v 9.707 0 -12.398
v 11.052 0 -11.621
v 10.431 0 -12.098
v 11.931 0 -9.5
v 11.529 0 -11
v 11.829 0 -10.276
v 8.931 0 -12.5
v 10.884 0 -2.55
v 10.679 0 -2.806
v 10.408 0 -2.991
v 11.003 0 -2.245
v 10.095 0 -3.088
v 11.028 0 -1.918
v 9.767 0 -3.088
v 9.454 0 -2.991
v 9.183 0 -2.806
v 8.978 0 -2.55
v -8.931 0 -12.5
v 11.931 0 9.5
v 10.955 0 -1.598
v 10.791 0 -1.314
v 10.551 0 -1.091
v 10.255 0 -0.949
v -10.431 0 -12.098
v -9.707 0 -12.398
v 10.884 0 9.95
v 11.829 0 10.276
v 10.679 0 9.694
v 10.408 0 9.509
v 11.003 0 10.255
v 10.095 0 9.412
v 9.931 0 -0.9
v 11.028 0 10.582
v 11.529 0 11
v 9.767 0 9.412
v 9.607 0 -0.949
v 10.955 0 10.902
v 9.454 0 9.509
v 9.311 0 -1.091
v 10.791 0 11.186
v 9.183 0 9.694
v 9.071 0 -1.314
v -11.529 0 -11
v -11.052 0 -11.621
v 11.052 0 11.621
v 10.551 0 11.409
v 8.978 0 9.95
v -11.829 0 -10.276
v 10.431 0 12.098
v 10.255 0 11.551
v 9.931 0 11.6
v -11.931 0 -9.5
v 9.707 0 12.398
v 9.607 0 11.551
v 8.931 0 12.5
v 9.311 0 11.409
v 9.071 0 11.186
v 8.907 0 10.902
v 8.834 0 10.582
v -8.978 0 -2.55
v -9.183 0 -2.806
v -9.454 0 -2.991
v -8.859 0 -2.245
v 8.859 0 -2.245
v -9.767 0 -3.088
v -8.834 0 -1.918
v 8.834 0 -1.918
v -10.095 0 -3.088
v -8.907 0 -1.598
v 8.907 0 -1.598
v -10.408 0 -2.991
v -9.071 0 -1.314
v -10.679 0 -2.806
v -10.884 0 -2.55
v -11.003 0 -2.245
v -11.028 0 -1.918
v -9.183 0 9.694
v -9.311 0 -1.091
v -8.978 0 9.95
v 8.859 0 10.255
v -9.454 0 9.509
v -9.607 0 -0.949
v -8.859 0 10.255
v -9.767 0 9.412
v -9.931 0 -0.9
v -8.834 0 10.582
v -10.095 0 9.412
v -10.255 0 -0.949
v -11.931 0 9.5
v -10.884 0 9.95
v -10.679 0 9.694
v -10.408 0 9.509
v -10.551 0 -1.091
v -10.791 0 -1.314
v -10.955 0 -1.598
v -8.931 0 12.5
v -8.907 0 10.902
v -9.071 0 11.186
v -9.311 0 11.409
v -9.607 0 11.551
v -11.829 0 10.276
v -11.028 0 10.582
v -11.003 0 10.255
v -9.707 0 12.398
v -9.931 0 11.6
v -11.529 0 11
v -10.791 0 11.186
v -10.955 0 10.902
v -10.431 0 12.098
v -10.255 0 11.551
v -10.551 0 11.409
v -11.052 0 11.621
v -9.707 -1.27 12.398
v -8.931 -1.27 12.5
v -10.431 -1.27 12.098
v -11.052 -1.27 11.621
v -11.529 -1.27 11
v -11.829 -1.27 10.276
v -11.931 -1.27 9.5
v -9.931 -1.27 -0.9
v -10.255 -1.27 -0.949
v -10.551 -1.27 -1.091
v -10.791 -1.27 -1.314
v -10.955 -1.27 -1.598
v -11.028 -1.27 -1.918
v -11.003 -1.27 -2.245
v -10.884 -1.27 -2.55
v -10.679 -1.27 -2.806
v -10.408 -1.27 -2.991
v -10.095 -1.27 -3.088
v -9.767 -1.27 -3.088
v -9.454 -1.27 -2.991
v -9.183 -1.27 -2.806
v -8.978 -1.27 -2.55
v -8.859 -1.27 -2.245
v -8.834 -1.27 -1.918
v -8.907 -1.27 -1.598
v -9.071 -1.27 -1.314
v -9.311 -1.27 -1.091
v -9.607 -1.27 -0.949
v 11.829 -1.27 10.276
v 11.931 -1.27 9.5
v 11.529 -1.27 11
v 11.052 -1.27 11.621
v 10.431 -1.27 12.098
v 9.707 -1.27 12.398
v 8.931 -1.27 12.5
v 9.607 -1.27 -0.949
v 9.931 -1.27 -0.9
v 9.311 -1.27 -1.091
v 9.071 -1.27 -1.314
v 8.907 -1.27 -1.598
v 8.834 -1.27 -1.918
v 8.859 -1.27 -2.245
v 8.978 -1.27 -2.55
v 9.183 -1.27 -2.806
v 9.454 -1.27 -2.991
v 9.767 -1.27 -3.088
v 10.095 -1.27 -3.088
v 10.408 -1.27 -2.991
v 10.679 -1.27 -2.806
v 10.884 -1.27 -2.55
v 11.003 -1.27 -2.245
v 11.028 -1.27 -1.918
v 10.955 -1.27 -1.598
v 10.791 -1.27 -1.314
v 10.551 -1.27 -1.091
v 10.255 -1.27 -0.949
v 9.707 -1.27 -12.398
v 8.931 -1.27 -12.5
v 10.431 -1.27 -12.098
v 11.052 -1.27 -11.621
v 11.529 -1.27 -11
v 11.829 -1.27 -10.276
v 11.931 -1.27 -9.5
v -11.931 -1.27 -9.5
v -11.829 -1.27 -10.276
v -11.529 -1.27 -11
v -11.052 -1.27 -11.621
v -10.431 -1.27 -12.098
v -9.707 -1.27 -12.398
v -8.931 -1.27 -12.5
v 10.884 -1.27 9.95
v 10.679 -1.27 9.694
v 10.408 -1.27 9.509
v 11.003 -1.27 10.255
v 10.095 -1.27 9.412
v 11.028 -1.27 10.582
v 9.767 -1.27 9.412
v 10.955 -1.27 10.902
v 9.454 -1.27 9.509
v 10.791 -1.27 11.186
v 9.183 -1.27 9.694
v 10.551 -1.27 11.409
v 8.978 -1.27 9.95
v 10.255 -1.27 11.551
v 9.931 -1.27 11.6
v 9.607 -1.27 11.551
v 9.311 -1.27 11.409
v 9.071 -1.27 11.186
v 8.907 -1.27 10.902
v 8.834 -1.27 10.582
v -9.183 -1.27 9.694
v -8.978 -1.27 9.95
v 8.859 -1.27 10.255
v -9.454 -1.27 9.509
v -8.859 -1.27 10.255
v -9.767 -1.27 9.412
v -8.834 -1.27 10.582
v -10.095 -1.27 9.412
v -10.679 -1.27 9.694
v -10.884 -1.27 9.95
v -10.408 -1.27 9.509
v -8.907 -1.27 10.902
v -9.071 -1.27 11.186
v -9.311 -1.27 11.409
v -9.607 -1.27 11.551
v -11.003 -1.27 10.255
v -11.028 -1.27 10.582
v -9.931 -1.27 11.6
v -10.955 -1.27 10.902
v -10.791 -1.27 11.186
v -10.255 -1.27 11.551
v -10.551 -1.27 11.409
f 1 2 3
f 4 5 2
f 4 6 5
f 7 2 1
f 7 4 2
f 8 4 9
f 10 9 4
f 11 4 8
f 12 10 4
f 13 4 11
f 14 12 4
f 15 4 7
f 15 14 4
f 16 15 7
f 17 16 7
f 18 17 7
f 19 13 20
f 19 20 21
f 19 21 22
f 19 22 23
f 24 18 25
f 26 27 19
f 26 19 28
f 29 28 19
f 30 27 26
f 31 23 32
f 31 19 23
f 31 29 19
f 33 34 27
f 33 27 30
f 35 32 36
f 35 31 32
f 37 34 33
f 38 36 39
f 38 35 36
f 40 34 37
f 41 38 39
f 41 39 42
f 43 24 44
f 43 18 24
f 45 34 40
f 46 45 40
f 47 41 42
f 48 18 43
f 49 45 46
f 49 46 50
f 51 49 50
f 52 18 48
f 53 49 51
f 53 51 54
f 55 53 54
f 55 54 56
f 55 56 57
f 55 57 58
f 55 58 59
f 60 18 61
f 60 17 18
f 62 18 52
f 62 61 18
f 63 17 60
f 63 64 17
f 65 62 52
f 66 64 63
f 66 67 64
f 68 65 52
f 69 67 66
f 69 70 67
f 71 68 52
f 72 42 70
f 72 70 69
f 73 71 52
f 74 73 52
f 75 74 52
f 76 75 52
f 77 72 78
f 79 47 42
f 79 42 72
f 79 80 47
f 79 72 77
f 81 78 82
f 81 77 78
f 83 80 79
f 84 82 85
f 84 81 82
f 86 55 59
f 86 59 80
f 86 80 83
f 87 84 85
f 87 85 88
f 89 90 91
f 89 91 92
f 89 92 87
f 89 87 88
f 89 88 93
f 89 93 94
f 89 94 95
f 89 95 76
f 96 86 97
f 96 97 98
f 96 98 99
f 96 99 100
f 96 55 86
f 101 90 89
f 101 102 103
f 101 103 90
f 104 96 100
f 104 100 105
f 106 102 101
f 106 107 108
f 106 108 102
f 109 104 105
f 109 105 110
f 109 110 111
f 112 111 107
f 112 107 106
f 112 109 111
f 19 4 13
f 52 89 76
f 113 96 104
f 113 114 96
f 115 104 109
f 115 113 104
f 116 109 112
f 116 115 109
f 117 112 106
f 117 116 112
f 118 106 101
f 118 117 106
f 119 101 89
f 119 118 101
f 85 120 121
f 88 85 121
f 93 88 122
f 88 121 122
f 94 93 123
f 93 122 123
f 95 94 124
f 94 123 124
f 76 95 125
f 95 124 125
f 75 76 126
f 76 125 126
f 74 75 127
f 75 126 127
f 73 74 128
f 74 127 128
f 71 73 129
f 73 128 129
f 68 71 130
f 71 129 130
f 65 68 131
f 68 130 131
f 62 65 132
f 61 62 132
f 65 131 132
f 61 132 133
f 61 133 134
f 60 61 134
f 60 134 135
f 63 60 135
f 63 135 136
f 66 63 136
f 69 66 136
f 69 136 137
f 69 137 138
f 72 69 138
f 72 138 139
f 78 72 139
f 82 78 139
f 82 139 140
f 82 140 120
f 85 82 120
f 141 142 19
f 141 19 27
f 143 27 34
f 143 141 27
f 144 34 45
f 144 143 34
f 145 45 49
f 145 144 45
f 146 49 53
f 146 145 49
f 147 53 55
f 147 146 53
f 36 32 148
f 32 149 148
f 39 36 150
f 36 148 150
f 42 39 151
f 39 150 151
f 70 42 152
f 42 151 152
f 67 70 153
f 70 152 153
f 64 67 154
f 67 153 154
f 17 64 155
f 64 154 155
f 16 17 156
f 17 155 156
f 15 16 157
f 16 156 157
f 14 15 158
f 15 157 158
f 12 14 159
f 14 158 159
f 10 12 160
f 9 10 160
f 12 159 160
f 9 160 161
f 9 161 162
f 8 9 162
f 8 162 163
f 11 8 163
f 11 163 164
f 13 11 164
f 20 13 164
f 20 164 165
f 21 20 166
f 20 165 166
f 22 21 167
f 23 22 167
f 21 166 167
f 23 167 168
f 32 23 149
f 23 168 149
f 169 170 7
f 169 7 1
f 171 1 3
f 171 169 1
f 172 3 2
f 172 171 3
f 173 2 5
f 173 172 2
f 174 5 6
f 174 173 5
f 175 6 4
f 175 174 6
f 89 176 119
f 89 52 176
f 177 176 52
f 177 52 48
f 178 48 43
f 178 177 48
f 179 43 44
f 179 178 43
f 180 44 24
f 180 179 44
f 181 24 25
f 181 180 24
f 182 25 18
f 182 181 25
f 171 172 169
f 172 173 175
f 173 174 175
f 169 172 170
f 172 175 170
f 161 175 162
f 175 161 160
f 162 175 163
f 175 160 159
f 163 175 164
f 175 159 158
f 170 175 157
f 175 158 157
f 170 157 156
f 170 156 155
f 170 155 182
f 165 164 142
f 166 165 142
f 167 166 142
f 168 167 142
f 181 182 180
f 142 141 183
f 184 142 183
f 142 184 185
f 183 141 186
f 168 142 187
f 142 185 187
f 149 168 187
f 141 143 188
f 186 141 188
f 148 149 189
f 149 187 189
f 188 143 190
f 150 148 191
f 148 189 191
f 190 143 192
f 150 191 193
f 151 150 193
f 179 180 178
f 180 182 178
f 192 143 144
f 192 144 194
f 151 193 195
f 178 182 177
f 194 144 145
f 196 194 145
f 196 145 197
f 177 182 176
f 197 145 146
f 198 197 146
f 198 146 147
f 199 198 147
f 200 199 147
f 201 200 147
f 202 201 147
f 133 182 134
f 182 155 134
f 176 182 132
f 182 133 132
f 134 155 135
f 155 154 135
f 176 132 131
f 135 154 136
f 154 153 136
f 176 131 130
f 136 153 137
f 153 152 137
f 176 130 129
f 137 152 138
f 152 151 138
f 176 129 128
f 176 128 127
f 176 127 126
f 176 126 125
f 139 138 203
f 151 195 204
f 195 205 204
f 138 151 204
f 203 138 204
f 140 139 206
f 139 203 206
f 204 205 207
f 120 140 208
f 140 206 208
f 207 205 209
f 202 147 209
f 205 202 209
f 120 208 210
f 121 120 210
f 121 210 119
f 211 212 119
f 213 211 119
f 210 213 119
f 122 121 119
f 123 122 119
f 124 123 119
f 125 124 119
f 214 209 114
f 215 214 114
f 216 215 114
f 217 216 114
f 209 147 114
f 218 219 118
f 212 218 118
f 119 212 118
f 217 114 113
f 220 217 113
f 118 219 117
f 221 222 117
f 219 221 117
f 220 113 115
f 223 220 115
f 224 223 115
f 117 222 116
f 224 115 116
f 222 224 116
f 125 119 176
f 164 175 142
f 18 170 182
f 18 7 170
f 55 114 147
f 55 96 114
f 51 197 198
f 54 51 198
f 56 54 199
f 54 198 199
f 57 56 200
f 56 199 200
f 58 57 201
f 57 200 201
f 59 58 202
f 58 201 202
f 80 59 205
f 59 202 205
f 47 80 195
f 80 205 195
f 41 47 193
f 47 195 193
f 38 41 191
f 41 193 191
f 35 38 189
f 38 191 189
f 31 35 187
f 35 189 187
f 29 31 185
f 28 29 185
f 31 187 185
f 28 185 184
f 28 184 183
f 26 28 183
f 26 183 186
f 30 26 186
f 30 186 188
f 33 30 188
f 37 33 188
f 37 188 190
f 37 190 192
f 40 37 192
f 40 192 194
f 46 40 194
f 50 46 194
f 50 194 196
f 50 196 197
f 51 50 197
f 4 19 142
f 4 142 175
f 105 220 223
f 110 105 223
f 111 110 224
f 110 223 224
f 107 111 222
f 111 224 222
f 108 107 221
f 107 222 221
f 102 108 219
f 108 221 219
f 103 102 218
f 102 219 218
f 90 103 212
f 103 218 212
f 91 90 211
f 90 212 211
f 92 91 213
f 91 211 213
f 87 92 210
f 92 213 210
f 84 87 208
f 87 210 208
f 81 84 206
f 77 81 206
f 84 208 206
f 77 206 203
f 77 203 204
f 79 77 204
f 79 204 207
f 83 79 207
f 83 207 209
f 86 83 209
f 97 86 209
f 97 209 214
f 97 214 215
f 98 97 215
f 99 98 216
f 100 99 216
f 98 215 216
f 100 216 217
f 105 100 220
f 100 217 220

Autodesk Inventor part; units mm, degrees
ref_plane "YZ Plane" through (0, 0, 0) normal (1, 0, 0) x (0, 1, 0)
ref_plane "XZ Plane" through (0, 0, 0) normal (0, 1, 0) x (-1, 0, 0)
ref_plane "XY Plane" through (0, 0, 0) normal (0, 0, 1) x (1, 0, 0)
sketch "Sketch1" plane through (0, 0, 0) normal (0, 1, 0) x (-1, 0, 0)
  line L0 (11.931, 12.5) -> (-11.931, 12.5)
  line L1 (-11.931, 12.5) -> (-11.931, -12.5)
  line L2 (-11.931, -12.5) -> (11.931, -12.5)
  line L3 (11.931, -12.5) -> (11.931, 12.5)
  line L4 (11.931, 12.5) -> (-11.931, -12.5) construction
  line L5 (-11.931, 12.5) -> (11.931, -12.5) construction
  point P0 (0, 0)
  point P1 (-29, 11.5)
  point P2 (-29, -11.5)
  dimension "d0" = 23.862
  dimension "d1" = 25
extrude "Extrusion1" add sketch "Sketch1" against normal blind 1.27
fillet "Fillet1" radius 3 4 edges at (-11.931, -0.635, 12.5) (11.931, -0.635, 12.5) (11.931, -0.635, -12.5) (-11.931, -0.635, -12.5)
sketch "Sketch3" plane through (0, 0, 0) normal (0, 1, 0) x (1, 0, 0)
  line L0 (9.931, -10.5) -> (-9.931, -10.5) construction
  line L1 (-9.931, -10.5) -> (-9.931, 2) construction
  line L2 (-9.931, 2) -> (9.931, 2) construction
  line L3 (9.931, 2) -> (9.931, -10.5) construction
  line L4 (-8.931, -12.5) -> (8.931, -12.5) projected
  line L5 (11.931, -9.5) -> (11.931, 9.5) projected
  line L6 (-11.931, 9.5) -> (-11.931, -9.5) projected
  point P0 (0, 0)
  dimension "d16" = 2
  dimension "d17" = 2
  dimension "d18" = 2
  dimension "d19" = 14.5
hole "Hole2" at (9.931, 0, 10.5) at (9.931, 0, -2) at (-9.931, 0, -2) at (-9.931, 0, 10.5) direction (0, -1, 0) diameter 2.2 end through all
equation "\"d0\" = PiCameraLength"
equation "\"d1\" = PiCameraWidth"
equation "\"d4\" = PiZeroWHeight"
equation "\"PiZeroWHeight\" = 1.27"
equation "\"PiCameraWidth\" = 25"
equation "\"PiCameraLength\" = 23.862"
properties part number "PiCameraWithMechanicalLayout" material "LCP Plastic"
